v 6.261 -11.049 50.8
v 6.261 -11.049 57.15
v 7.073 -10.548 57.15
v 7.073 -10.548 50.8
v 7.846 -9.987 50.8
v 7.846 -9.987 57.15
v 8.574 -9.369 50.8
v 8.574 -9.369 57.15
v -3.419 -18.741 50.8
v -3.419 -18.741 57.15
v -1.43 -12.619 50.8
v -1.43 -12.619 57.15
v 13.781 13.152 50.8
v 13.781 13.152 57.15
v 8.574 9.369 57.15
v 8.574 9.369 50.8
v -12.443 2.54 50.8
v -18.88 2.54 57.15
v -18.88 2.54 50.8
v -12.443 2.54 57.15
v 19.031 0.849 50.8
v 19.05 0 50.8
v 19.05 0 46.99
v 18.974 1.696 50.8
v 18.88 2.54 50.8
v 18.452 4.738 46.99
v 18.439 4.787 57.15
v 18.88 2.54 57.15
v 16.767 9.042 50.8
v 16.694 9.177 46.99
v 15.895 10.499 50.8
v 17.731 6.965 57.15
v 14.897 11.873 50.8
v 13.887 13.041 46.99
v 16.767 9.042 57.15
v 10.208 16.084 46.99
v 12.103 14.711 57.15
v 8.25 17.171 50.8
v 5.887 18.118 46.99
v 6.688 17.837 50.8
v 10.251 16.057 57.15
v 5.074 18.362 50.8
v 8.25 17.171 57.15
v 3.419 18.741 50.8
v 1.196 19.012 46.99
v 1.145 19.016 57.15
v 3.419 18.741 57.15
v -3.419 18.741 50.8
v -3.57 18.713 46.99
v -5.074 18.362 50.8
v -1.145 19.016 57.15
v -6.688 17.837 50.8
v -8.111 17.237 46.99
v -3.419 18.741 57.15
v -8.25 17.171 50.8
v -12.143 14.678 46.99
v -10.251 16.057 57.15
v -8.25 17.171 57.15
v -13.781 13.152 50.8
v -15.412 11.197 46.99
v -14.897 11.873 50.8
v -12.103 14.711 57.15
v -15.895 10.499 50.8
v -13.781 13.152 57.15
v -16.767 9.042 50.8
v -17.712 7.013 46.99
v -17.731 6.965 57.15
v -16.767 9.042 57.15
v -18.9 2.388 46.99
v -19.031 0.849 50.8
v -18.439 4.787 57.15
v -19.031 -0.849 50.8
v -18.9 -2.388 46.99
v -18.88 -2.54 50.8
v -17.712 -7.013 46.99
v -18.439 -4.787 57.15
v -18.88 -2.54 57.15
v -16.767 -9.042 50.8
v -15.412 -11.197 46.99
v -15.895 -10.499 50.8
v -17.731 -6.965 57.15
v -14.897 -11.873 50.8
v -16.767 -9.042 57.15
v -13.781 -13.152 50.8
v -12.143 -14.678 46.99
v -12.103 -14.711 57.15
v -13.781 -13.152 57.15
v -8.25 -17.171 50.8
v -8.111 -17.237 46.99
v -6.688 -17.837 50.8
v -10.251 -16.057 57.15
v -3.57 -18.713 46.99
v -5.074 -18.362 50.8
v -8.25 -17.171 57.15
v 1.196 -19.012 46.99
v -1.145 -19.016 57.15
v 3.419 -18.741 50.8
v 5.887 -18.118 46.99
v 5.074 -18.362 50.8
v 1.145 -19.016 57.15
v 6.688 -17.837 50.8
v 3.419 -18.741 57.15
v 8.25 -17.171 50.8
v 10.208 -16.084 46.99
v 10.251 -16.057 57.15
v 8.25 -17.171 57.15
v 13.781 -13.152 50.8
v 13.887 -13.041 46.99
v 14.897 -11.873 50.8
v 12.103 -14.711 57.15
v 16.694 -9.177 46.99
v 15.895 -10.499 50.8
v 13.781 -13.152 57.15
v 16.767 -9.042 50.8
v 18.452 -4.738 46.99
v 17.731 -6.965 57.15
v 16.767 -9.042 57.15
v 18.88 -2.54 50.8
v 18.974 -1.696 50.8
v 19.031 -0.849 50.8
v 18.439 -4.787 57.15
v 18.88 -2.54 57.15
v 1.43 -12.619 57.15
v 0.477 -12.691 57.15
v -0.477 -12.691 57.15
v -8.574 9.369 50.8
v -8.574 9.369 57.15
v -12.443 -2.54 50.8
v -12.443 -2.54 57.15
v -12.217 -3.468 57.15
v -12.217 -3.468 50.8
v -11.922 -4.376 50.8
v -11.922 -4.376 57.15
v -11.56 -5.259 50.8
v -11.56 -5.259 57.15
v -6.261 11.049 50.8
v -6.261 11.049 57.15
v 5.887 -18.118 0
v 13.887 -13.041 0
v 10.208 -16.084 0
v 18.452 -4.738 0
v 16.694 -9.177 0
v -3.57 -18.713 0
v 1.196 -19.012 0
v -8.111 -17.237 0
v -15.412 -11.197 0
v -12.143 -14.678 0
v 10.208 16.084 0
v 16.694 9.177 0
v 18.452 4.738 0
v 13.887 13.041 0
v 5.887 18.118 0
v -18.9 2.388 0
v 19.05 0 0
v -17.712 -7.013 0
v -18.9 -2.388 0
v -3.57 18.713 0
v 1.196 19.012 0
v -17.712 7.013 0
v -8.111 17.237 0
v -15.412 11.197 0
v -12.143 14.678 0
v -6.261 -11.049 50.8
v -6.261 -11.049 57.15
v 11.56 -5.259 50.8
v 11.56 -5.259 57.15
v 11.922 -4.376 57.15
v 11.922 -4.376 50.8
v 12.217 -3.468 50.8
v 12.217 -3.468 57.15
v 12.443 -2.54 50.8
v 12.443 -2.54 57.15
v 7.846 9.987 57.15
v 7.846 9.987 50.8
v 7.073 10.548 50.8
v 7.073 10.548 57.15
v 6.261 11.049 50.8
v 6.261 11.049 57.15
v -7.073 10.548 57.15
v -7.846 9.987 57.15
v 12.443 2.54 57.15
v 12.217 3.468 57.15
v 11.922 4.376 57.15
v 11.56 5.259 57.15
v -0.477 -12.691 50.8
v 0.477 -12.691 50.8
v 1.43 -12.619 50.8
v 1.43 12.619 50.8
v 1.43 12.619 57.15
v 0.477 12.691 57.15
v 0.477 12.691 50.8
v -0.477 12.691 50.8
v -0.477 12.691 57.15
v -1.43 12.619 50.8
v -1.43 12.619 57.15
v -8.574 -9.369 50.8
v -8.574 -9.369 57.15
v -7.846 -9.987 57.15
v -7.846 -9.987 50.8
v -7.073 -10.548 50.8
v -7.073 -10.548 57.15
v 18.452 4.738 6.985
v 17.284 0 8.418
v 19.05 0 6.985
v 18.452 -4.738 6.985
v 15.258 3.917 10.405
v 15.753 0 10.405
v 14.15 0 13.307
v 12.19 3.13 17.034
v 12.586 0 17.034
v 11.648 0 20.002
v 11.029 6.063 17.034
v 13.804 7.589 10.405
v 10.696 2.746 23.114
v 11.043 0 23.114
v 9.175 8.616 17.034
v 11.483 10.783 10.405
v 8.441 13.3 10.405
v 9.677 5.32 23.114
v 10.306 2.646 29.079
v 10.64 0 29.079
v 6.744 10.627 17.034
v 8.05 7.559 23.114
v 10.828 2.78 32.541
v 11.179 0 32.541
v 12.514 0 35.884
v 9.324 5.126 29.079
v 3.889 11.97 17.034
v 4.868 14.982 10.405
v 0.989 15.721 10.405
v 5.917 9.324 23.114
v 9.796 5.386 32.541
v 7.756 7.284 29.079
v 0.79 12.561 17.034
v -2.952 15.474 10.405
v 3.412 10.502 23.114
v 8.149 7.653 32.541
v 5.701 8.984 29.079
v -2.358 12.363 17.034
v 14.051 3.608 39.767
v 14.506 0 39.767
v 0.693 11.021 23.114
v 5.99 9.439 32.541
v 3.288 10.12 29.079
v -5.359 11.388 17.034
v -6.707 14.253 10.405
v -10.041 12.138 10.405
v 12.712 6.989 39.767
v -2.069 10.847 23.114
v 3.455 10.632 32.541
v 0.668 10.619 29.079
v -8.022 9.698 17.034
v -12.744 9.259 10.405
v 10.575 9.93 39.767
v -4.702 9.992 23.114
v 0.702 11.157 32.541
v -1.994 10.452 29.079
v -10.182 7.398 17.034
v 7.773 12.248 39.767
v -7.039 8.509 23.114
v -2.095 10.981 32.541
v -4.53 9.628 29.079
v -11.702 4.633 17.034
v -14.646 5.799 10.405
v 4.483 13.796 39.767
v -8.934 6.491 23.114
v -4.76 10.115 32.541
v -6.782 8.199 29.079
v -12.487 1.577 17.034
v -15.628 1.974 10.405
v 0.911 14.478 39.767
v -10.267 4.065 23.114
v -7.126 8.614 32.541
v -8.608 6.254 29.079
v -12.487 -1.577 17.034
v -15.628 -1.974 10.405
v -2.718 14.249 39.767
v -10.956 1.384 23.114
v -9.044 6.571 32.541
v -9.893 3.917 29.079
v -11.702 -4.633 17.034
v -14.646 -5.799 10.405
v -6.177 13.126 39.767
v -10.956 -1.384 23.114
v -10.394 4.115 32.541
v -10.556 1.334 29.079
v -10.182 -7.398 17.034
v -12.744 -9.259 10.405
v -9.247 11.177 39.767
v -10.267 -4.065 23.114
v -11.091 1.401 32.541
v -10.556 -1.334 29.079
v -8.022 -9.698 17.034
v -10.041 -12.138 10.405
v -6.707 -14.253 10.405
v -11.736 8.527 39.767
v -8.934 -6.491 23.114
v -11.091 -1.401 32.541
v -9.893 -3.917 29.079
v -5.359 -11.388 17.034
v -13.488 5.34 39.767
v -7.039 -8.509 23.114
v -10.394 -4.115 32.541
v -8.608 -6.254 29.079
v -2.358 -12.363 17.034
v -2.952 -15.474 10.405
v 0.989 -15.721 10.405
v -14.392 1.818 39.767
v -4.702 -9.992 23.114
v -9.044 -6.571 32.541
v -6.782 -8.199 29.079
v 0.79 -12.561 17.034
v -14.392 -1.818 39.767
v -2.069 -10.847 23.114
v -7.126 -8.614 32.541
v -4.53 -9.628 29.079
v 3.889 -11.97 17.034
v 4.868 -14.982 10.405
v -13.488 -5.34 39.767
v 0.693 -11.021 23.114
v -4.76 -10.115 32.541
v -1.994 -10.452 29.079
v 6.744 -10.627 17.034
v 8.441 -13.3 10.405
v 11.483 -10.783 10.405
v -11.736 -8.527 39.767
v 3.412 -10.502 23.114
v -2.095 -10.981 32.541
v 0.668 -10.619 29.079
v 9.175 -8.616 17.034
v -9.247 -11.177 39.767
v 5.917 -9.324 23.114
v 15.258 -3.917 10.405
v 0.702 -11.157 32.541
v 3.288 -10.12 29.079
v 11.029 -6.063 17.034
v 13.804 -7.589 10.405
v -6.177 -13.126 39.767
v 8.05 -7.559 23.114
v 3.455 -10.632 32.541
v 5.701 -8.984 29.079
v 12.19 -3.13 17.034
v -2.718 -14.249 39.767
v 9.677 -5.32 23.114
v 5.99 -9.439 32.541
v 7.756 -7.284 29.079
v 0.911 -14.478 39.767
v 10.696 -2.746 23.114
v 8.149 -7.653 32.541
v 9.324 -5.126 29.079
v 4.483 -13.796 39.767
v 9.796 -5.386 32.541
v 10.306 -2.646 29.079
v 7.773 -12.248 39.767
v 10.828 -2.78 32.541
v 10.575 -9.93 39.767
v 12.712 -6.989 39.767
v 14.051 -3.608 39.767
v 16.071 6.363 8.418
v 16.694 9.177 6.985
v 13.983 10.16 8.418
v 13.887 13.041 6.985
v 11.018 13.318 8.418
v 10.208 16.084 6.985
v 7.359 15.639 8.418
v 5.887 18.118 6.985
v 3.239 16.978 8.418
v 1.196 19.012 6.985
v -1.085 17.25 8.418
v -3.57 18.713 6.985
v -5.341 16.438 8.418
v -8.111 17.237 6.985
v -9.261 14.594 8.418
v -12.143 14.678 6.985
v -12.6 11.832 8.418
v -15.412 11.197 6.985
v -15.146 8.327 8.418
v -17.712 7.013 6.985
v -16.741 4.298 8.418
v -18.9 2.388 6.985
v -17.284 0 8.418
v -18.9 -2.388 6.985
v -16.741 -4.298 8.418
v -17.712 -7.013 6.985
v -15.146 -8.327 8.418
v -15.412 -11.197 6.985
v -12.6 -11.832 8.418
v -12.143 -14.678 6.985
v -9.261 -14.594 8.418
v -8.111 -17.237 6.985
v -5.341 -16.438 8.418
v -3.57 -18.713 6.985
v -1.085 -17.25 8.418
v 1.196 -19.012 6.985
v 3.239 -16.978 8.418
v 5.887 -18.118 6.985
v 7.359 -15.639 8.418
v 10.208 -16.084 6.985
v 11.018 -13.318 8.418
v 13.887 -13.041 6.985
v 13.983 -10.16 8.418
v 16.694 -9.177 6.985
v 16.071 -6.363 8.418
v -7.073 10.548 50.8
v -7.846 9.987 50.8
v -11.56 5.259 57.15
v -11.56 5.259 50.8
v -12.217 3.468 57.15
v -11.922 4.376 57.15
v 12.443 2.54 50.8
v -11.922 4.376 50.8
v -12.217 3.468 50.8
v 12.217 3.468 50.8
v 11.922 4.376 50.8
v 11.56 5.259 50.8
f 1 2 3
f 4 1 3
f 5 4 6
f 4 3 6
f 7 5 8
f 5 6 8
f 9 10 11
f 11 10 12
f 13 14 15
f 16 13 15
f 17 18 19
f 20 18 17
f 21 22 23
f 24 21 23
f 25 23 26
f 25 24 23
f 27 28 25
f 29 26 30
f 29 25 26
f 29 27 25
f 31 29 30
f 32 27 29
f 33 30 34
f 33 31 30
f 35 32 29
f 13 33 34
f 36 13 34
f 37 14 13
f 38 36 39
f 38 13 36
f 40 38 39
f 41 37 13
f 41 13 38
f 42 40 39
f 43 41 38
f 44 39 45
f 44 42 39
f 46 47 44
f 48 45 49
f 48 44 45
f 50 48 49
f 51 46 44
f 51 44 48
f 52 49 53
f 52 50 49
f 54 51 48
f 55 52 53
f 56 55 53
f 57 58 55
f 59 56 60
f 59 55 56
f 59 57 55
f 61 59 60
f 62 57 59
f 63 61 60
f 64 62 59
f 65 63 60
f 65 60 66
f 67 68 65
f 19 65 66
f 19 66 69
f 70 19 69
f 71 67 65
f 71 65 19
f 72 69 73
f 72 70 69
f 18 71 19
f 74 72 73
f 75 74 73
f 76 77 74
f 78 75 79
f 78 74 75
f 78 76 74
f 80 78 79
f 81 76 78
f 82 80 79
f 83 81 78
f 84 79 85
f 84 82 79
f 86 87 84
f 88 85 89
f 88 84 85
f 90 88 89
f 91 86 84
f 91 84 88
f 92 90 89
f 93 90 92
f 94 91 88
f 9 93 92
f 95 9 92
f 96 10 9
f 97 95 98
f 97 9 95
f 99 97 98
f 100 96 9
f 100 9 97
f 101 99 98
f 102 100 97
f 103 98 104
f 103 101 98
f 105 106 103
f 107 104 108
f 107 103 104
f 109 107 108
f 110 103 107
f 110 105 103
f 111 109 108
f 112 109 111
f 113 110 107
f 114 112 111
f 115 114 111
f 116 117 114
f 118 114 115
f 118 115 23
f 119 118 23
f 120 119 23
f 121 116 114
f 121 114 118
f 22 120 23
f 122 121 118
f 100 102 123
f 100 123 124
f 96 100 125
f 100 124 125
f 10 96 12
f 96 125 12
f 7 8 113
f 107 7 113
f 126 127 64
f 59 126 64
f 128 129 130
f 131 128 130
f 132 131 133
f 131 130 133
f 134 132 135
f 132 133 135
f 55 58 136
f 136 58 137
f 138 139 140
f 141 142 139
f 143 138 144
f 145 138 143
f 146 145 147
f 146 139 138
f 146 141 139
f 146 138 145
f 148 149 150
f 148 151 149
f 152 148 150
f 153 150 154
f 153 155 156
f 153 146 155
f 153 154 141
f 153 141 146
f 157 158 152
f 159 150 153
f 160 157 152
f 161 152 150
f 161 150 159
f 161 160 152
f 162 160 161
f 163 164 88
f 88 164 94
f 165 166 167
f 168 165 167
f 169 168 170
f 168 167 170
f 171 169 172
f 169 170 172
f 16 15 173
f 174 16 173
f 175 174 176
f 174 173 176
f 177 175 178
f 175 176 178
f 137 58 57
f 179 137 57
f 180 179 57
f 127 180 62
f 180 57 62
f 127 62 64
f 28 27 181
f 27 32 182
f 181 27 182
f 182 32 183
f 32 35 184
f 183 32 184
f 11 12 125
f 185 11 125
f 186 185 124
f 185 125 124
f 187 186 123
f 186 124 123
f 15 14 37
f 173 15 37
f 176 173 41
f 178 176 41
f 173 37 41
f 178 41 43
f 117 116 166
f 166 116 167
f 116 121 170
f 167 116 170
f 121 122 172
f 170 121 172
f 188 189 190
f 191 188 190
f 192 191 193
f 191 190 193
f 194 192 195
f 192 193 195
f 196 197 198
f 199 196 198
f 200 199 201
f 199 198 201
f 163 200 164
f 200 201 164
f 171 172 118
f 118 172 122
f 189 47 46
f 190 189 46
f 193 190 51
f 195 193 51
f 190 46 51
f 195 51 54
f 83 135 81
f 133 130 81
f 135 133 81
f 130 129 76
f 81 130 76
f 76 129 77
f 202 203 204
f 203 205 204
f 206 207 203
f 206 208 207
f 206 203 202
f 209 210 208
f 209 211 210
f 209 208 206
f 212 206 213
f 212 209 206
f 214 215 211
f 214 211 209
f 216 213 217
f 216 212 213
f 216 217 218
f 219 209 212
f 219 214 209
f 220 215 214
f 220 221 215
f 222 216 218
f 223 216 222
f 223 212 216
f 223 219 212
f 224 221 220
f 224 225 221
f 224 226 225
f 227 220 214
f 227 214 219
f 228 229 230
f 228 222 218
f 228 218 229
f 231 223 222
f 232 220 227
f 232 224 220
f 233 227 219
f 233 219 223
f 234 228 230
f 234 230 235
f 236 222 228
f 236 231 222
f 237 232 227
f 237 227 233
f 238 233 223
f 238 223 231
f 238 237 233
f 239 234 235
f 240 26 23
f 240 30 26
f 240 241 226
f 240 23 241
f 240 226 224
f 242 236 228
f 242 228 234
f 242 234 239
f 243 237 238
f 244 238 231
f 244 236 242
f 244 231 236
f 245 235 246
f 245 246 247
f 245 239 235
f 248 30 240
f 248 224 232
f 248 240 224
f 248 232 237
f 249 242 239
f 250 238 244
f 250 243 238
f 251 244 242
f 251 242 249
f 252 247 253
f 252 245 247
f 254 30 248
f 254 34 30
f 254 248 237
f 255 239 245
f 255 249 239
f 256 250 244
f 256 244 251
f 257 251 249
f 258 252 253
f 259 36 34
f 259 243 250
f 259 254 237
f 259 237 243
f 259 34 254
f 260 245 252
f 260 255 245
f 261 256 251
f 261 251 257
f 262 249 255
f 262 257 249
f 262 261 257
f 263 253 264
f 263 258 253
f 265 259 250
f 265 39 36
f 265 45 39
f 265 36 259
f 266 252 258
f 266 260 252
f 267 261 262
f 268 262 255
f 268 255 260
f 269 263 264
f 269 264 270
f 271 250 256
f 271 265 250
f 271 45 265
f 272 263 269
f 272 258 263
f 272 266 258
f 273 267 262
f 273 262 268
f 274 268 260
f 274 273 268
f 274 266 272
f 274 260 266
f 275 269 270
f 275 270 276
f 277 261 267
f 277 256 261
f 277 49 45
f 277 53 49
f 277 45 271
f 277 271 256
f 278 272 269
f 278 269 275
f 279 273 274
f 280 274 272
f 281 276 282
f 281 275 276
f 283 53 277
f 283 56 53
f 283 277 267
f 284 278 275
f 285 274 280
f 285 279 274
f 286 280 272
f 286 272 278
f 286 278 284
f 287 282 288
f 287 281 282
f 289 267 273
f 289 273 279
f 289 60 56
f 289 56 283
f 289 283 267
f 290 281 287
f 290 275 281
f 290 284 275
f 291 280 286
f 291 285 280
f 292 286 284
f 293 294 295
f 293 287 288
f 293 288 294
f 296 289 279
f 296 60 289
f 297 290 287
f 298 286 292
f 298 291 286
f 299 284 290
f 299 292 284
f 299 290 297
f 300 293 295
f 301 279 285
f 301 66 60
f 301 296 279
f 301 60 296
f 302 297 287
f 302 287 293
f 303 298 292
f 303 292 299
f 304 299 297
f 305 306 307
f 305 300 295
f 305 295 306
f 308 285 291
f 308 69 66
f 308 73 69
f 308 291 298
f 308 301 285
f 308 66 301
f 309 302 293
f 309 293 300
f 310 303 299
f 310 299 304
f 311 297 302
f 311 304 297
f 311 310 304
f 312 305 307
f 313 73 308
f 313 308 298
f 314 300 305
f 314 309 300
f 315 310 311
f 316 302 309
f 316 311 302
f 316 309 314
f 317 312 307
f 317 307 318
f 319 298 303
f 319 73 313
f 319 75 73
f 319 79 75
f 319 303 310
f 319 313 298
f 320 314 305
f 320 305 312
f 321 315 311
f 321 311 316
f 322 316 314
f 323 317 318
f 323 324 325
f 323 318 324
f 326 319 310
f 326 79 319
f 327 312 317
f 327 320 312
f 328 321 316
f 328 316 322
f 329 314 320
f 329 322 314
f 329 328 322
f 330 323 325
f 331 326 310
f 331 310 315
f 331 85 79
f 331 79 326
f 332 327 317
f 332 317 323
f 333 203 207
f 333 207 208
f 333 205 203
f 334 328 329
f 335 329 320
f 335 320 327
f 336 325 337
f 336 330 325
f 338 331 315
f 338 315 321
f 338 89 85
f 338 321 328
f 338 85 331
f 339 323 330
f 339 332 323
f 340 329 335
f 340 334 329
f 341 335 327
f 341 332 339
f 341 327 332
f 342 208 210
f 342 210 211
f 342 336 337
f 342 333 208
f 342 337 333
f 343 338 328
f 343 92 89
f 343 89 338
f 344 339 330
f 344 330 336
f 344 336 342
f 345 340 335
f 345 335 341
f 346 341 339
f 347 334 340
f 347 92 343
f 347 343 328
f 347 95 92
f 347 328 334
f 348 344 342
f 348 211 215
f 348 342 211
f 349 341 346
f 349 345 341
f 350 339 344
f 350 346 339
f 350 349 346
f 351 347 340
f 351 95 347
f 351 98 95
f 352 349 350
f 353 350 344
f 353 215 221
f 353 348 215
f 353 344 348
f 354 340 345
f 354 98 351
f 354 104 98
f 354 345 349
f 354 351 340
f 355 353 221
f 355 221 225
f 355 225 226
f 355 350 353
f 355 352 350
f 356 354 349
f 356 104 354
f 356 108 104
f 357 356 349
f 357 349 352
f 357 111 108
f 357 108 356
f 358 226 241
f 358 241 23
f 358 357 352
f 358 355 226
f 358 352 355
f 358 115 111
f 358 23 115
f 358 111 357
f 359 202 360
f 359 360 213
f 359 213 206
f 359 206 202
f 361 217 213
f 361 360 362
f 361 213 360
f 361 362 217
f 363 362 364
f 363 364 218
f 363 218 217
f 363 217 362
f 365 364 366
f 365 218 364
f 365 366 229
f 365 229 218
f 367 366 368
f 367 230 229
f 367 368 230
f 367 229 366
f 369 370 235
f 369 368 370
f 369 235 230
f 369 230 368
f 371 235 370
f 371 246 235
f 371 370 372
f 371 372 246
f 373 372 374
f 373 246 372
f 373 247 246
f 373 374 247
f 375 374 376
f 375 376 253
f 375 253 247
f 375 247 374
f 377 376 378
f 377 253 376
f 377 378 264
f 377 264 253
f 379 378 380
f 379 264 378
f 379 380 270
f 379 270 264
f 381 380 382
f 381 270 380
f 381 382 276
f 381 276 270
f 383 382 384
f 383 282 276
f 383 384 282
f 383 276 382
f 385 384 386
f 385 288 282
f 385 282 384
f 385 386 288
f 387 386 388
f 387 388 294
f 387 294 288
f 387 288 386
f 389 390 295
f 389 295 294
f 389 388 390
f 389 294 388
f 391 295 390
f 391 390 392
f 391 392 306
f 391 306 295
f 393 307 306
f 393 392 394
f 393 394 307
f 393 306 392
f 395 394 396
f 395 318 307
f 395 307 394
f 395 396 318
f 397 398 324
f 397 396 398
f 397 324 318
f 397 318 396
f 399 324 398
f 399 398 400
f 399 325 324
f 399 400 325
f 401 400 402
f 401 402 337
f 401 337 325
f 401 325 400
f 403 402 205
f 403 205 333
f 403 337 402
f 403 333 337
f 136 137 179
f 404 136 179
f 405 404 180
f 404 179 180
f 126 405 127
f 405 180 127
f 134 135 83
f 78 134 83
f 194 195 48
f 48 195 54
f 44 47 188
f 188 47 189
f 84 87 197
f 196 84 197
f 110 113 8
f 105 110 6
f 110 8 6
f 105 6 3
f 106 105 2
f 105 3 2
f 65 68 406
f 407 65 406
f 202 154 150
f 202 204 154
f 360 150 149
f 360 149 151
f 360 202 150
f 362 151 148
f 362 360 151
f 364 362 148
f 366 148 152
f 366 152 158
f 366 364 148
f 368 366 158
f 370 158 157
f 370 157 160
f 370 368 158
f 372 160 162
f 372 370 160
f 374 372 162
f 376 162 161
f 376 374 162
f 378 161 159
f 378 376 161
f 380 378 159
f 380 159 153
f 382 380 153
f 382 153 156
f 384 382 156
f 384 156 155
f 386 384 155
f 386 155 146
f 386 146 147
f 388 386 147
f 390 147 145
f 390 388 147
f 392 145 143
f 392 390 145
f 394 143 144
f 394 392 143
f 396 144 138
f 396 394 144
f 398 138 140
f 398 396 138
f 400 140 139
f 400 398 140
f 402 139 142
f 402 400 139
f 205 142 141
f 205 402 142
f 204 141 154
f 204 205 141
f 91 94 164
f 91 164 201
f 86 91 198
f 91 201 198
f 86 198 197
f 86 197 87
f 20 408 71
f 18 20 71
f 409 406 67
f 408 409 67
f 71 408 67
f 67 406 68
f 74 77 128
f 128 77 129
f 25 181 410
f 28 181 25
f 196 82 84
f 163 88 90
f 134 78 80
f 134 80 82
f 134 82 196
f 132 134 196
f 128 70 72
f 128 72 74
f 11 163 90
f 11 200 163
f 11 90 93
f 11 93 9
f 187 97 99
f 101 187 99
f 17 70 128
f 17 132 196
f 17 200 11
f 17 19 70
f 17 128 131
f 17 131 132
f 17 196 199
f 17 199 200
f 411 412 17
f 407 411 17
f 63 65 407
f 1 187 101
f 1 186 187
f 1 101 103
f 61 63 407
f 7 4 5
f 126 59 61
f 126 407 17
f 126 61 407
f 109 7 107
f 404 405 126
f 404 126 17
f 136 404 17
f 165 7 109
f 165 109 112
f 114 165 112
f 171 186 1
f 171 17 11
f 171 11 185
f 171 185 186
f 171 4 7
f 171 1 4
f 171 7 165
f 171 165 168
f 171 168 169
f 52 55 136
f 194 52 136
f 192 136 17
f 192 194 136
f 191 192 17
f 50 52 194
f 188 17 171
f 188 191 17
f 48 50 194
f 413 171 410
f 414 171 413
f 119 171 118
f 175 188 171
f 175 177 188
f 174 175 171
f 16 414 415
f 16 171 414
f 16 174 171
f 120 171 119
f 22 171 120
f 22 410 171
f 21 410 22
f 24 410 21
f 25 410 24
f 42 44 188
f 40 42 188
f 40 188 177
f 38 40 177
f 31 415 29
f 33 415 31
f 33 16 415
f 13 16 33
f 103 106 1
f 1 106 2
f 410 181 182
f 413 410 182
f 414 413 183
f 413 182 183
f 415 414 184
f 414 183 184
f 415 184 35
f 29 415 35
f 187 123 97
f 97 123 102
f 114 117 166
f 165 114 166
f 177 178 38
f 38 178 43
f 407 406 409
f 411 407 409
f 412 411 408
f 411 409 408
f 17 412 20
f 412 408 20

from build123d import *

# Parameters (mm, degrees)
F0_W     = 19.05
F0_H     = 10.16
F2_R     = 12.7
F3_DEPTH = 6.35
F4_W     = 7.2063849882
F4_H     = 5.08
F5_DEPTH = 6.35


with BuildPart() as f1:
    # F0 (on Front) → F1 (revolve)
    with BuildSketch(Plane.XZ):
        with BuildLine():
            Line((0, 46.99), (0, 0))
            Line((0, 0), (19.05, 0))
            Line((19.05, 0), (19.05, 6.985))
            add(Edge.make_bspline(
                [(19.05, 6.985), (16.2391823394, 8.5810058703), (12.6188776664, 16.288597078), (10.9922878006, 22.0505625493), (10.305692607, 30.1006807739), (11.6872230365, 34.2073674129), (13.795029925, 38.6193750914), (15.9890974554, 42.3022760514), (18.1140442061, 45.4568990599), (19.05, 46.99)],
                knots=[0, 0, 0, 0, 0.1903034554, 0.3390772007, 0.4978932907, 0.618503958, 0.7432602735, 0.8640913793, 1, 1, 1, 1], degree=3))
            Line((19.05, 46.99), (0, 46.99))
        make_face()
        with Locations((9.525, 52.07)):
            Rectangle(F0_W, F0_H)
    revolve(axis=Axis((0, 0, 28.575), (0, 0, 1)))

    # F2 (on face) → F3 (cut)
    with BuildSketch(Plane.XY.offset(57.15)):
        Circle(F2_R)
    extrude(amount=-F3_DEPTH, mode=Mode.SUBTRACT)

    # F4 (on face) → F5 (cut)
    with BuildSketch(Plane.XY.offset(57.15)):
        with Locations((16.0466003874, 0)):
            Rectangle(F4_W, F4_H)
        Polygon((14.4040418363, 13.6047616321), (8.5739539128, 9.3689548137), (11.5599029945, 5.2591484823), (17.3899909179, 9.4949553006), align=None)
        Polygon((3.6564363849, 19.4729667295), (1.4295409556, 12.6192873276), (6.2609080584, 11.0494809962), (8.4878034877, 17.9031603981), align=None)
        Polygon((-8.4878034877, 17.9031603981), (-6.2609080584, 11.0494809962), (-1.4295409556, 12.6192873276), (-3.6564363849, 19.4729667295), align=None)
        Polygon((-17.3899909179, 9.4949553006), (-11.5599029945, 5.2591484823), (-8.5739539128, 9.3689548137), (-14.4040418363, 13.6047616321), align=None)
        with Locations((-16.0466003874, 0)):
            Rectangle(F4_W, F4_H)
        Polygon((-14.4040418363, -13.6047616321), (-8.5739539128, -9.3689548137), (-11.5599029945, -5.2591484823), (-17.3899909179, -9.4949553006), align=None)
        Polygon((-3.6564363849, -19.4729667295), (-1.4295409556, -12.6192873276), (-6.2609080584, -11.0494809962), (-8.4878034877, -17.9031603981), align=None)
        Polygon((8.4878034877, -17.9031603981), (6.2609080584, -11.0494809962), (1.4295409556, -12.6192873276), (3.6564363849, -19.4729667295), align=None)
        Polygon((17.3899909179, -9.4949553006), (11.5599029945, -5.2591484823), (8.5739539128, -9.3689548137), (14.4040418363, -13.6047616321), align=None)
    extrude(amount=-F5_DEPTH, mode=Mode.SUBTRACT)


solid = f1.part
